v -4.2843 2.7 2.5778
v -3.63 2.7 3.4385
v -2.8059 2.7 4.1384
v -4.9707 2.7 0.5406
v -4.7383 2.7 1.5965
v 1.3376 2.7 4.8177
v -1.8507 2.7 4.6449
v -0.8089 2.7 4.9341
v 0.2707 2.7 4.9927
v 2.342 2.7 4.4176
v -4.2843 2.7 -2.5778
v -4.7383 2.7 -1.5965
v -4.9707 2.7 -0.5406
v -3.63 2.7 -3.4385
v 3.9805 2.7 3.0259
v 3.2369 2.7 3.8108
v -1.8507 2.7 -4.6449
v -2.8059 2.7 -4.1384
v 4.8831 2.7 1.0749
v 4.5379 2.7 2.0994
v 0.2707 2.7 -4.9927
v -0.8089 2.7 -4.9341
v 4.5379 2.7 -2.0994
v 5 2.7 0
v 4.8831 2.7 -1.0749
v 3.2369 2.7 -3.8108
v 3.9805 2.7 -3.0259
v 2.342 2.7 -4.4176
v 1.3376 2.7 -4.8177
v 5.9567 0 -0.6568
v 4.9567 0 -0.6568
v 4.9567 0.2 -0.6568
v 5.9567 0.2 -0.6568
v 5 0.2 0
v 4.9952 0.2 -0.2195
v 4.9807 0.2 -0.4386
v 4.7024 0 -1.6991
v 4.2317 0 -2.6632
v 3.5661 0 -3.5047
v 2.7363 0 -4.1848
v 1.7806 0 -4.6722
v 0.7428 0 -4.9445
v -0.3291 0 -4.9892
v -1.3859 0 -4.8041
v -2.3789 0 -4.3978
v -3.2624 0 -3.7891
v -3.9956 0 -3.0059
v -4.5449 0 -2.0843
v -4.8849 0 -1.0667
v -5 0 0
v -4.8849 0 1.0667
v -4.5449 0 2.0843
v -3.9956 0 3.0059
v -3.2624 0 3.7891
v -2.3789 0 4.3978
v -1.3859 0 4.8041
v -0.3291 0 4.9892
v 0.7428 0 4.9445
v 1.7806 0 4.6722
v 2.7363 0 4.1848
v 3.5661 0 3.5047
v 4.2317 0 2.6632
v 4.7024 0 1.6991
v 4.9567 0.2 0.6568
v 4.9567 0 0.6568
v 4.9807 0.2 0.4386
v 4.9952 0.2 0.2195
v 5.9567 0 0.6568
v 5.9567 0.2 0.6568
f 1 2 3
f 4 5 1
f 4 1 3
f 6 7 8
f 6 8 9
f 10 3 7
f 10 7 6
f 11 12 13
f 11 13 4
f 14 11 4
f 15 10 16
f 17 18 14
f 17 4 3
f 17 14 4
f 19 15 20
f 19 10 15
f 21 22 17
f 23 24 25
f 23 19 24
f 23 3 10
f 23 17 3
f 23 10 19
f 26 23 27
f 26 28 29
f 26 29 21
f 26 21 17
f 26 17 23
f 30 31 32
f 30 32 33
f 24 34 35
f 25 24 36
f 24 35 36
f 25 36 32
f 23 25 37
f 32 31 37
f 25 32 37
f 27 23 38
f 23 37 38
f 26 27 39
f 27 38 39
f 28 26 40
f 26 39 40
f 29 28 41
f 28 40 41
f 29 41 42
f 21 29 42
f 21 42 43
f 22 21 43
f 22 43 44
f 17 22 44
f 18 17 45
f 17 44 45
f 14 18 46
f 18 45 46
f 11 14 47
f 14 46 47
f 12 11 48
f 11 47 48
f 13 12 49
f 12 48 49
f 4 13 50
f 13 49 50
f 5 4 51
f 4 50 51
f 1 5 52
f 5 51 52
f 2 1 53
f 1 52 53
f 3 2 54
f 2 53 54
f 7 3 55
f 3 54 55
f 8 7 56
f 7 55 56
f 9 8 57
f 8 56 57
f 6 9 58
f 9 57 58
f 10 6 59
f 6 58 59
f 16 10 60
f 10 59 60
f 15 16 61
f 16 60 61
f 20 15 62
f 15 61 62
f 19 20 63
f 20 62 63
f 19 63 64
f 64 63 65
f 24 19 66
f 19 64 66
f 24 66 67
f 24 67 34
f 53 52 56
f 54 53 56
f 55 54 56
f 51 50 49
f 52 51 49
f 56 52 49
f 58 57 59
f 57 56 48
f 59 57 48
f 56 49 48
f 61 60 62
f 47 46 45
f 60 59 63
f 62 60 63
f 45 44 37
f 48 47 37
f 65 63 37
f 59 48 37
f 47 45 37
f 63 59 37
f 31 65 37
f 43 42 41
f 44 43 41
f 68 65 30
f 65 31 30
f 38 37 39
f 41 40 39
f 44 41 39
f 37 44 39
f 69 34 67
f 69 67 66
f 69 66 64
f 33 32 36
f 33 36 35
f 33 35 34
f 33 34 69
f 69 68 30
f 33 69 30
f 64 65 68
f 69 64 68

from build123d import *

# Parameters (mm, degrees)
SKETCH1_R           = 5
BOSS_EXTRUDE1_DEPTH = 2.7
SKETCH2_W           = 1
SKETCH2_H           = 1.31363251
BOSS_EXTRUDE2_DEPTH = 0.2


with BuildPart() as part:
    # Sketch1 → Boss-Extrude1 (new body)
    with BuildSketch(Plane(origin=(0, 0, 0), x_dir=(1, 0, 0), z_dir=(0, 1, 0))):
        Circle(SKETCH1_R)
    extrude(amount=BOSS_EXTRUDE1_DEPTH)

    # Sketch2 → Boss-Extrude2 (add)
    with BuildSketch(Plane(origin=(0, 0, 0), x_dir=(1, 0, 0), z_dir=(0, 1, 0))):
        with Locations((5.456671505, 0)):
            Rectangle(SKETCH2_W, SKETCH2_H)
    extrude(amount=BOSS_EXTRUDE2_DEPTH)


solid = part.part
